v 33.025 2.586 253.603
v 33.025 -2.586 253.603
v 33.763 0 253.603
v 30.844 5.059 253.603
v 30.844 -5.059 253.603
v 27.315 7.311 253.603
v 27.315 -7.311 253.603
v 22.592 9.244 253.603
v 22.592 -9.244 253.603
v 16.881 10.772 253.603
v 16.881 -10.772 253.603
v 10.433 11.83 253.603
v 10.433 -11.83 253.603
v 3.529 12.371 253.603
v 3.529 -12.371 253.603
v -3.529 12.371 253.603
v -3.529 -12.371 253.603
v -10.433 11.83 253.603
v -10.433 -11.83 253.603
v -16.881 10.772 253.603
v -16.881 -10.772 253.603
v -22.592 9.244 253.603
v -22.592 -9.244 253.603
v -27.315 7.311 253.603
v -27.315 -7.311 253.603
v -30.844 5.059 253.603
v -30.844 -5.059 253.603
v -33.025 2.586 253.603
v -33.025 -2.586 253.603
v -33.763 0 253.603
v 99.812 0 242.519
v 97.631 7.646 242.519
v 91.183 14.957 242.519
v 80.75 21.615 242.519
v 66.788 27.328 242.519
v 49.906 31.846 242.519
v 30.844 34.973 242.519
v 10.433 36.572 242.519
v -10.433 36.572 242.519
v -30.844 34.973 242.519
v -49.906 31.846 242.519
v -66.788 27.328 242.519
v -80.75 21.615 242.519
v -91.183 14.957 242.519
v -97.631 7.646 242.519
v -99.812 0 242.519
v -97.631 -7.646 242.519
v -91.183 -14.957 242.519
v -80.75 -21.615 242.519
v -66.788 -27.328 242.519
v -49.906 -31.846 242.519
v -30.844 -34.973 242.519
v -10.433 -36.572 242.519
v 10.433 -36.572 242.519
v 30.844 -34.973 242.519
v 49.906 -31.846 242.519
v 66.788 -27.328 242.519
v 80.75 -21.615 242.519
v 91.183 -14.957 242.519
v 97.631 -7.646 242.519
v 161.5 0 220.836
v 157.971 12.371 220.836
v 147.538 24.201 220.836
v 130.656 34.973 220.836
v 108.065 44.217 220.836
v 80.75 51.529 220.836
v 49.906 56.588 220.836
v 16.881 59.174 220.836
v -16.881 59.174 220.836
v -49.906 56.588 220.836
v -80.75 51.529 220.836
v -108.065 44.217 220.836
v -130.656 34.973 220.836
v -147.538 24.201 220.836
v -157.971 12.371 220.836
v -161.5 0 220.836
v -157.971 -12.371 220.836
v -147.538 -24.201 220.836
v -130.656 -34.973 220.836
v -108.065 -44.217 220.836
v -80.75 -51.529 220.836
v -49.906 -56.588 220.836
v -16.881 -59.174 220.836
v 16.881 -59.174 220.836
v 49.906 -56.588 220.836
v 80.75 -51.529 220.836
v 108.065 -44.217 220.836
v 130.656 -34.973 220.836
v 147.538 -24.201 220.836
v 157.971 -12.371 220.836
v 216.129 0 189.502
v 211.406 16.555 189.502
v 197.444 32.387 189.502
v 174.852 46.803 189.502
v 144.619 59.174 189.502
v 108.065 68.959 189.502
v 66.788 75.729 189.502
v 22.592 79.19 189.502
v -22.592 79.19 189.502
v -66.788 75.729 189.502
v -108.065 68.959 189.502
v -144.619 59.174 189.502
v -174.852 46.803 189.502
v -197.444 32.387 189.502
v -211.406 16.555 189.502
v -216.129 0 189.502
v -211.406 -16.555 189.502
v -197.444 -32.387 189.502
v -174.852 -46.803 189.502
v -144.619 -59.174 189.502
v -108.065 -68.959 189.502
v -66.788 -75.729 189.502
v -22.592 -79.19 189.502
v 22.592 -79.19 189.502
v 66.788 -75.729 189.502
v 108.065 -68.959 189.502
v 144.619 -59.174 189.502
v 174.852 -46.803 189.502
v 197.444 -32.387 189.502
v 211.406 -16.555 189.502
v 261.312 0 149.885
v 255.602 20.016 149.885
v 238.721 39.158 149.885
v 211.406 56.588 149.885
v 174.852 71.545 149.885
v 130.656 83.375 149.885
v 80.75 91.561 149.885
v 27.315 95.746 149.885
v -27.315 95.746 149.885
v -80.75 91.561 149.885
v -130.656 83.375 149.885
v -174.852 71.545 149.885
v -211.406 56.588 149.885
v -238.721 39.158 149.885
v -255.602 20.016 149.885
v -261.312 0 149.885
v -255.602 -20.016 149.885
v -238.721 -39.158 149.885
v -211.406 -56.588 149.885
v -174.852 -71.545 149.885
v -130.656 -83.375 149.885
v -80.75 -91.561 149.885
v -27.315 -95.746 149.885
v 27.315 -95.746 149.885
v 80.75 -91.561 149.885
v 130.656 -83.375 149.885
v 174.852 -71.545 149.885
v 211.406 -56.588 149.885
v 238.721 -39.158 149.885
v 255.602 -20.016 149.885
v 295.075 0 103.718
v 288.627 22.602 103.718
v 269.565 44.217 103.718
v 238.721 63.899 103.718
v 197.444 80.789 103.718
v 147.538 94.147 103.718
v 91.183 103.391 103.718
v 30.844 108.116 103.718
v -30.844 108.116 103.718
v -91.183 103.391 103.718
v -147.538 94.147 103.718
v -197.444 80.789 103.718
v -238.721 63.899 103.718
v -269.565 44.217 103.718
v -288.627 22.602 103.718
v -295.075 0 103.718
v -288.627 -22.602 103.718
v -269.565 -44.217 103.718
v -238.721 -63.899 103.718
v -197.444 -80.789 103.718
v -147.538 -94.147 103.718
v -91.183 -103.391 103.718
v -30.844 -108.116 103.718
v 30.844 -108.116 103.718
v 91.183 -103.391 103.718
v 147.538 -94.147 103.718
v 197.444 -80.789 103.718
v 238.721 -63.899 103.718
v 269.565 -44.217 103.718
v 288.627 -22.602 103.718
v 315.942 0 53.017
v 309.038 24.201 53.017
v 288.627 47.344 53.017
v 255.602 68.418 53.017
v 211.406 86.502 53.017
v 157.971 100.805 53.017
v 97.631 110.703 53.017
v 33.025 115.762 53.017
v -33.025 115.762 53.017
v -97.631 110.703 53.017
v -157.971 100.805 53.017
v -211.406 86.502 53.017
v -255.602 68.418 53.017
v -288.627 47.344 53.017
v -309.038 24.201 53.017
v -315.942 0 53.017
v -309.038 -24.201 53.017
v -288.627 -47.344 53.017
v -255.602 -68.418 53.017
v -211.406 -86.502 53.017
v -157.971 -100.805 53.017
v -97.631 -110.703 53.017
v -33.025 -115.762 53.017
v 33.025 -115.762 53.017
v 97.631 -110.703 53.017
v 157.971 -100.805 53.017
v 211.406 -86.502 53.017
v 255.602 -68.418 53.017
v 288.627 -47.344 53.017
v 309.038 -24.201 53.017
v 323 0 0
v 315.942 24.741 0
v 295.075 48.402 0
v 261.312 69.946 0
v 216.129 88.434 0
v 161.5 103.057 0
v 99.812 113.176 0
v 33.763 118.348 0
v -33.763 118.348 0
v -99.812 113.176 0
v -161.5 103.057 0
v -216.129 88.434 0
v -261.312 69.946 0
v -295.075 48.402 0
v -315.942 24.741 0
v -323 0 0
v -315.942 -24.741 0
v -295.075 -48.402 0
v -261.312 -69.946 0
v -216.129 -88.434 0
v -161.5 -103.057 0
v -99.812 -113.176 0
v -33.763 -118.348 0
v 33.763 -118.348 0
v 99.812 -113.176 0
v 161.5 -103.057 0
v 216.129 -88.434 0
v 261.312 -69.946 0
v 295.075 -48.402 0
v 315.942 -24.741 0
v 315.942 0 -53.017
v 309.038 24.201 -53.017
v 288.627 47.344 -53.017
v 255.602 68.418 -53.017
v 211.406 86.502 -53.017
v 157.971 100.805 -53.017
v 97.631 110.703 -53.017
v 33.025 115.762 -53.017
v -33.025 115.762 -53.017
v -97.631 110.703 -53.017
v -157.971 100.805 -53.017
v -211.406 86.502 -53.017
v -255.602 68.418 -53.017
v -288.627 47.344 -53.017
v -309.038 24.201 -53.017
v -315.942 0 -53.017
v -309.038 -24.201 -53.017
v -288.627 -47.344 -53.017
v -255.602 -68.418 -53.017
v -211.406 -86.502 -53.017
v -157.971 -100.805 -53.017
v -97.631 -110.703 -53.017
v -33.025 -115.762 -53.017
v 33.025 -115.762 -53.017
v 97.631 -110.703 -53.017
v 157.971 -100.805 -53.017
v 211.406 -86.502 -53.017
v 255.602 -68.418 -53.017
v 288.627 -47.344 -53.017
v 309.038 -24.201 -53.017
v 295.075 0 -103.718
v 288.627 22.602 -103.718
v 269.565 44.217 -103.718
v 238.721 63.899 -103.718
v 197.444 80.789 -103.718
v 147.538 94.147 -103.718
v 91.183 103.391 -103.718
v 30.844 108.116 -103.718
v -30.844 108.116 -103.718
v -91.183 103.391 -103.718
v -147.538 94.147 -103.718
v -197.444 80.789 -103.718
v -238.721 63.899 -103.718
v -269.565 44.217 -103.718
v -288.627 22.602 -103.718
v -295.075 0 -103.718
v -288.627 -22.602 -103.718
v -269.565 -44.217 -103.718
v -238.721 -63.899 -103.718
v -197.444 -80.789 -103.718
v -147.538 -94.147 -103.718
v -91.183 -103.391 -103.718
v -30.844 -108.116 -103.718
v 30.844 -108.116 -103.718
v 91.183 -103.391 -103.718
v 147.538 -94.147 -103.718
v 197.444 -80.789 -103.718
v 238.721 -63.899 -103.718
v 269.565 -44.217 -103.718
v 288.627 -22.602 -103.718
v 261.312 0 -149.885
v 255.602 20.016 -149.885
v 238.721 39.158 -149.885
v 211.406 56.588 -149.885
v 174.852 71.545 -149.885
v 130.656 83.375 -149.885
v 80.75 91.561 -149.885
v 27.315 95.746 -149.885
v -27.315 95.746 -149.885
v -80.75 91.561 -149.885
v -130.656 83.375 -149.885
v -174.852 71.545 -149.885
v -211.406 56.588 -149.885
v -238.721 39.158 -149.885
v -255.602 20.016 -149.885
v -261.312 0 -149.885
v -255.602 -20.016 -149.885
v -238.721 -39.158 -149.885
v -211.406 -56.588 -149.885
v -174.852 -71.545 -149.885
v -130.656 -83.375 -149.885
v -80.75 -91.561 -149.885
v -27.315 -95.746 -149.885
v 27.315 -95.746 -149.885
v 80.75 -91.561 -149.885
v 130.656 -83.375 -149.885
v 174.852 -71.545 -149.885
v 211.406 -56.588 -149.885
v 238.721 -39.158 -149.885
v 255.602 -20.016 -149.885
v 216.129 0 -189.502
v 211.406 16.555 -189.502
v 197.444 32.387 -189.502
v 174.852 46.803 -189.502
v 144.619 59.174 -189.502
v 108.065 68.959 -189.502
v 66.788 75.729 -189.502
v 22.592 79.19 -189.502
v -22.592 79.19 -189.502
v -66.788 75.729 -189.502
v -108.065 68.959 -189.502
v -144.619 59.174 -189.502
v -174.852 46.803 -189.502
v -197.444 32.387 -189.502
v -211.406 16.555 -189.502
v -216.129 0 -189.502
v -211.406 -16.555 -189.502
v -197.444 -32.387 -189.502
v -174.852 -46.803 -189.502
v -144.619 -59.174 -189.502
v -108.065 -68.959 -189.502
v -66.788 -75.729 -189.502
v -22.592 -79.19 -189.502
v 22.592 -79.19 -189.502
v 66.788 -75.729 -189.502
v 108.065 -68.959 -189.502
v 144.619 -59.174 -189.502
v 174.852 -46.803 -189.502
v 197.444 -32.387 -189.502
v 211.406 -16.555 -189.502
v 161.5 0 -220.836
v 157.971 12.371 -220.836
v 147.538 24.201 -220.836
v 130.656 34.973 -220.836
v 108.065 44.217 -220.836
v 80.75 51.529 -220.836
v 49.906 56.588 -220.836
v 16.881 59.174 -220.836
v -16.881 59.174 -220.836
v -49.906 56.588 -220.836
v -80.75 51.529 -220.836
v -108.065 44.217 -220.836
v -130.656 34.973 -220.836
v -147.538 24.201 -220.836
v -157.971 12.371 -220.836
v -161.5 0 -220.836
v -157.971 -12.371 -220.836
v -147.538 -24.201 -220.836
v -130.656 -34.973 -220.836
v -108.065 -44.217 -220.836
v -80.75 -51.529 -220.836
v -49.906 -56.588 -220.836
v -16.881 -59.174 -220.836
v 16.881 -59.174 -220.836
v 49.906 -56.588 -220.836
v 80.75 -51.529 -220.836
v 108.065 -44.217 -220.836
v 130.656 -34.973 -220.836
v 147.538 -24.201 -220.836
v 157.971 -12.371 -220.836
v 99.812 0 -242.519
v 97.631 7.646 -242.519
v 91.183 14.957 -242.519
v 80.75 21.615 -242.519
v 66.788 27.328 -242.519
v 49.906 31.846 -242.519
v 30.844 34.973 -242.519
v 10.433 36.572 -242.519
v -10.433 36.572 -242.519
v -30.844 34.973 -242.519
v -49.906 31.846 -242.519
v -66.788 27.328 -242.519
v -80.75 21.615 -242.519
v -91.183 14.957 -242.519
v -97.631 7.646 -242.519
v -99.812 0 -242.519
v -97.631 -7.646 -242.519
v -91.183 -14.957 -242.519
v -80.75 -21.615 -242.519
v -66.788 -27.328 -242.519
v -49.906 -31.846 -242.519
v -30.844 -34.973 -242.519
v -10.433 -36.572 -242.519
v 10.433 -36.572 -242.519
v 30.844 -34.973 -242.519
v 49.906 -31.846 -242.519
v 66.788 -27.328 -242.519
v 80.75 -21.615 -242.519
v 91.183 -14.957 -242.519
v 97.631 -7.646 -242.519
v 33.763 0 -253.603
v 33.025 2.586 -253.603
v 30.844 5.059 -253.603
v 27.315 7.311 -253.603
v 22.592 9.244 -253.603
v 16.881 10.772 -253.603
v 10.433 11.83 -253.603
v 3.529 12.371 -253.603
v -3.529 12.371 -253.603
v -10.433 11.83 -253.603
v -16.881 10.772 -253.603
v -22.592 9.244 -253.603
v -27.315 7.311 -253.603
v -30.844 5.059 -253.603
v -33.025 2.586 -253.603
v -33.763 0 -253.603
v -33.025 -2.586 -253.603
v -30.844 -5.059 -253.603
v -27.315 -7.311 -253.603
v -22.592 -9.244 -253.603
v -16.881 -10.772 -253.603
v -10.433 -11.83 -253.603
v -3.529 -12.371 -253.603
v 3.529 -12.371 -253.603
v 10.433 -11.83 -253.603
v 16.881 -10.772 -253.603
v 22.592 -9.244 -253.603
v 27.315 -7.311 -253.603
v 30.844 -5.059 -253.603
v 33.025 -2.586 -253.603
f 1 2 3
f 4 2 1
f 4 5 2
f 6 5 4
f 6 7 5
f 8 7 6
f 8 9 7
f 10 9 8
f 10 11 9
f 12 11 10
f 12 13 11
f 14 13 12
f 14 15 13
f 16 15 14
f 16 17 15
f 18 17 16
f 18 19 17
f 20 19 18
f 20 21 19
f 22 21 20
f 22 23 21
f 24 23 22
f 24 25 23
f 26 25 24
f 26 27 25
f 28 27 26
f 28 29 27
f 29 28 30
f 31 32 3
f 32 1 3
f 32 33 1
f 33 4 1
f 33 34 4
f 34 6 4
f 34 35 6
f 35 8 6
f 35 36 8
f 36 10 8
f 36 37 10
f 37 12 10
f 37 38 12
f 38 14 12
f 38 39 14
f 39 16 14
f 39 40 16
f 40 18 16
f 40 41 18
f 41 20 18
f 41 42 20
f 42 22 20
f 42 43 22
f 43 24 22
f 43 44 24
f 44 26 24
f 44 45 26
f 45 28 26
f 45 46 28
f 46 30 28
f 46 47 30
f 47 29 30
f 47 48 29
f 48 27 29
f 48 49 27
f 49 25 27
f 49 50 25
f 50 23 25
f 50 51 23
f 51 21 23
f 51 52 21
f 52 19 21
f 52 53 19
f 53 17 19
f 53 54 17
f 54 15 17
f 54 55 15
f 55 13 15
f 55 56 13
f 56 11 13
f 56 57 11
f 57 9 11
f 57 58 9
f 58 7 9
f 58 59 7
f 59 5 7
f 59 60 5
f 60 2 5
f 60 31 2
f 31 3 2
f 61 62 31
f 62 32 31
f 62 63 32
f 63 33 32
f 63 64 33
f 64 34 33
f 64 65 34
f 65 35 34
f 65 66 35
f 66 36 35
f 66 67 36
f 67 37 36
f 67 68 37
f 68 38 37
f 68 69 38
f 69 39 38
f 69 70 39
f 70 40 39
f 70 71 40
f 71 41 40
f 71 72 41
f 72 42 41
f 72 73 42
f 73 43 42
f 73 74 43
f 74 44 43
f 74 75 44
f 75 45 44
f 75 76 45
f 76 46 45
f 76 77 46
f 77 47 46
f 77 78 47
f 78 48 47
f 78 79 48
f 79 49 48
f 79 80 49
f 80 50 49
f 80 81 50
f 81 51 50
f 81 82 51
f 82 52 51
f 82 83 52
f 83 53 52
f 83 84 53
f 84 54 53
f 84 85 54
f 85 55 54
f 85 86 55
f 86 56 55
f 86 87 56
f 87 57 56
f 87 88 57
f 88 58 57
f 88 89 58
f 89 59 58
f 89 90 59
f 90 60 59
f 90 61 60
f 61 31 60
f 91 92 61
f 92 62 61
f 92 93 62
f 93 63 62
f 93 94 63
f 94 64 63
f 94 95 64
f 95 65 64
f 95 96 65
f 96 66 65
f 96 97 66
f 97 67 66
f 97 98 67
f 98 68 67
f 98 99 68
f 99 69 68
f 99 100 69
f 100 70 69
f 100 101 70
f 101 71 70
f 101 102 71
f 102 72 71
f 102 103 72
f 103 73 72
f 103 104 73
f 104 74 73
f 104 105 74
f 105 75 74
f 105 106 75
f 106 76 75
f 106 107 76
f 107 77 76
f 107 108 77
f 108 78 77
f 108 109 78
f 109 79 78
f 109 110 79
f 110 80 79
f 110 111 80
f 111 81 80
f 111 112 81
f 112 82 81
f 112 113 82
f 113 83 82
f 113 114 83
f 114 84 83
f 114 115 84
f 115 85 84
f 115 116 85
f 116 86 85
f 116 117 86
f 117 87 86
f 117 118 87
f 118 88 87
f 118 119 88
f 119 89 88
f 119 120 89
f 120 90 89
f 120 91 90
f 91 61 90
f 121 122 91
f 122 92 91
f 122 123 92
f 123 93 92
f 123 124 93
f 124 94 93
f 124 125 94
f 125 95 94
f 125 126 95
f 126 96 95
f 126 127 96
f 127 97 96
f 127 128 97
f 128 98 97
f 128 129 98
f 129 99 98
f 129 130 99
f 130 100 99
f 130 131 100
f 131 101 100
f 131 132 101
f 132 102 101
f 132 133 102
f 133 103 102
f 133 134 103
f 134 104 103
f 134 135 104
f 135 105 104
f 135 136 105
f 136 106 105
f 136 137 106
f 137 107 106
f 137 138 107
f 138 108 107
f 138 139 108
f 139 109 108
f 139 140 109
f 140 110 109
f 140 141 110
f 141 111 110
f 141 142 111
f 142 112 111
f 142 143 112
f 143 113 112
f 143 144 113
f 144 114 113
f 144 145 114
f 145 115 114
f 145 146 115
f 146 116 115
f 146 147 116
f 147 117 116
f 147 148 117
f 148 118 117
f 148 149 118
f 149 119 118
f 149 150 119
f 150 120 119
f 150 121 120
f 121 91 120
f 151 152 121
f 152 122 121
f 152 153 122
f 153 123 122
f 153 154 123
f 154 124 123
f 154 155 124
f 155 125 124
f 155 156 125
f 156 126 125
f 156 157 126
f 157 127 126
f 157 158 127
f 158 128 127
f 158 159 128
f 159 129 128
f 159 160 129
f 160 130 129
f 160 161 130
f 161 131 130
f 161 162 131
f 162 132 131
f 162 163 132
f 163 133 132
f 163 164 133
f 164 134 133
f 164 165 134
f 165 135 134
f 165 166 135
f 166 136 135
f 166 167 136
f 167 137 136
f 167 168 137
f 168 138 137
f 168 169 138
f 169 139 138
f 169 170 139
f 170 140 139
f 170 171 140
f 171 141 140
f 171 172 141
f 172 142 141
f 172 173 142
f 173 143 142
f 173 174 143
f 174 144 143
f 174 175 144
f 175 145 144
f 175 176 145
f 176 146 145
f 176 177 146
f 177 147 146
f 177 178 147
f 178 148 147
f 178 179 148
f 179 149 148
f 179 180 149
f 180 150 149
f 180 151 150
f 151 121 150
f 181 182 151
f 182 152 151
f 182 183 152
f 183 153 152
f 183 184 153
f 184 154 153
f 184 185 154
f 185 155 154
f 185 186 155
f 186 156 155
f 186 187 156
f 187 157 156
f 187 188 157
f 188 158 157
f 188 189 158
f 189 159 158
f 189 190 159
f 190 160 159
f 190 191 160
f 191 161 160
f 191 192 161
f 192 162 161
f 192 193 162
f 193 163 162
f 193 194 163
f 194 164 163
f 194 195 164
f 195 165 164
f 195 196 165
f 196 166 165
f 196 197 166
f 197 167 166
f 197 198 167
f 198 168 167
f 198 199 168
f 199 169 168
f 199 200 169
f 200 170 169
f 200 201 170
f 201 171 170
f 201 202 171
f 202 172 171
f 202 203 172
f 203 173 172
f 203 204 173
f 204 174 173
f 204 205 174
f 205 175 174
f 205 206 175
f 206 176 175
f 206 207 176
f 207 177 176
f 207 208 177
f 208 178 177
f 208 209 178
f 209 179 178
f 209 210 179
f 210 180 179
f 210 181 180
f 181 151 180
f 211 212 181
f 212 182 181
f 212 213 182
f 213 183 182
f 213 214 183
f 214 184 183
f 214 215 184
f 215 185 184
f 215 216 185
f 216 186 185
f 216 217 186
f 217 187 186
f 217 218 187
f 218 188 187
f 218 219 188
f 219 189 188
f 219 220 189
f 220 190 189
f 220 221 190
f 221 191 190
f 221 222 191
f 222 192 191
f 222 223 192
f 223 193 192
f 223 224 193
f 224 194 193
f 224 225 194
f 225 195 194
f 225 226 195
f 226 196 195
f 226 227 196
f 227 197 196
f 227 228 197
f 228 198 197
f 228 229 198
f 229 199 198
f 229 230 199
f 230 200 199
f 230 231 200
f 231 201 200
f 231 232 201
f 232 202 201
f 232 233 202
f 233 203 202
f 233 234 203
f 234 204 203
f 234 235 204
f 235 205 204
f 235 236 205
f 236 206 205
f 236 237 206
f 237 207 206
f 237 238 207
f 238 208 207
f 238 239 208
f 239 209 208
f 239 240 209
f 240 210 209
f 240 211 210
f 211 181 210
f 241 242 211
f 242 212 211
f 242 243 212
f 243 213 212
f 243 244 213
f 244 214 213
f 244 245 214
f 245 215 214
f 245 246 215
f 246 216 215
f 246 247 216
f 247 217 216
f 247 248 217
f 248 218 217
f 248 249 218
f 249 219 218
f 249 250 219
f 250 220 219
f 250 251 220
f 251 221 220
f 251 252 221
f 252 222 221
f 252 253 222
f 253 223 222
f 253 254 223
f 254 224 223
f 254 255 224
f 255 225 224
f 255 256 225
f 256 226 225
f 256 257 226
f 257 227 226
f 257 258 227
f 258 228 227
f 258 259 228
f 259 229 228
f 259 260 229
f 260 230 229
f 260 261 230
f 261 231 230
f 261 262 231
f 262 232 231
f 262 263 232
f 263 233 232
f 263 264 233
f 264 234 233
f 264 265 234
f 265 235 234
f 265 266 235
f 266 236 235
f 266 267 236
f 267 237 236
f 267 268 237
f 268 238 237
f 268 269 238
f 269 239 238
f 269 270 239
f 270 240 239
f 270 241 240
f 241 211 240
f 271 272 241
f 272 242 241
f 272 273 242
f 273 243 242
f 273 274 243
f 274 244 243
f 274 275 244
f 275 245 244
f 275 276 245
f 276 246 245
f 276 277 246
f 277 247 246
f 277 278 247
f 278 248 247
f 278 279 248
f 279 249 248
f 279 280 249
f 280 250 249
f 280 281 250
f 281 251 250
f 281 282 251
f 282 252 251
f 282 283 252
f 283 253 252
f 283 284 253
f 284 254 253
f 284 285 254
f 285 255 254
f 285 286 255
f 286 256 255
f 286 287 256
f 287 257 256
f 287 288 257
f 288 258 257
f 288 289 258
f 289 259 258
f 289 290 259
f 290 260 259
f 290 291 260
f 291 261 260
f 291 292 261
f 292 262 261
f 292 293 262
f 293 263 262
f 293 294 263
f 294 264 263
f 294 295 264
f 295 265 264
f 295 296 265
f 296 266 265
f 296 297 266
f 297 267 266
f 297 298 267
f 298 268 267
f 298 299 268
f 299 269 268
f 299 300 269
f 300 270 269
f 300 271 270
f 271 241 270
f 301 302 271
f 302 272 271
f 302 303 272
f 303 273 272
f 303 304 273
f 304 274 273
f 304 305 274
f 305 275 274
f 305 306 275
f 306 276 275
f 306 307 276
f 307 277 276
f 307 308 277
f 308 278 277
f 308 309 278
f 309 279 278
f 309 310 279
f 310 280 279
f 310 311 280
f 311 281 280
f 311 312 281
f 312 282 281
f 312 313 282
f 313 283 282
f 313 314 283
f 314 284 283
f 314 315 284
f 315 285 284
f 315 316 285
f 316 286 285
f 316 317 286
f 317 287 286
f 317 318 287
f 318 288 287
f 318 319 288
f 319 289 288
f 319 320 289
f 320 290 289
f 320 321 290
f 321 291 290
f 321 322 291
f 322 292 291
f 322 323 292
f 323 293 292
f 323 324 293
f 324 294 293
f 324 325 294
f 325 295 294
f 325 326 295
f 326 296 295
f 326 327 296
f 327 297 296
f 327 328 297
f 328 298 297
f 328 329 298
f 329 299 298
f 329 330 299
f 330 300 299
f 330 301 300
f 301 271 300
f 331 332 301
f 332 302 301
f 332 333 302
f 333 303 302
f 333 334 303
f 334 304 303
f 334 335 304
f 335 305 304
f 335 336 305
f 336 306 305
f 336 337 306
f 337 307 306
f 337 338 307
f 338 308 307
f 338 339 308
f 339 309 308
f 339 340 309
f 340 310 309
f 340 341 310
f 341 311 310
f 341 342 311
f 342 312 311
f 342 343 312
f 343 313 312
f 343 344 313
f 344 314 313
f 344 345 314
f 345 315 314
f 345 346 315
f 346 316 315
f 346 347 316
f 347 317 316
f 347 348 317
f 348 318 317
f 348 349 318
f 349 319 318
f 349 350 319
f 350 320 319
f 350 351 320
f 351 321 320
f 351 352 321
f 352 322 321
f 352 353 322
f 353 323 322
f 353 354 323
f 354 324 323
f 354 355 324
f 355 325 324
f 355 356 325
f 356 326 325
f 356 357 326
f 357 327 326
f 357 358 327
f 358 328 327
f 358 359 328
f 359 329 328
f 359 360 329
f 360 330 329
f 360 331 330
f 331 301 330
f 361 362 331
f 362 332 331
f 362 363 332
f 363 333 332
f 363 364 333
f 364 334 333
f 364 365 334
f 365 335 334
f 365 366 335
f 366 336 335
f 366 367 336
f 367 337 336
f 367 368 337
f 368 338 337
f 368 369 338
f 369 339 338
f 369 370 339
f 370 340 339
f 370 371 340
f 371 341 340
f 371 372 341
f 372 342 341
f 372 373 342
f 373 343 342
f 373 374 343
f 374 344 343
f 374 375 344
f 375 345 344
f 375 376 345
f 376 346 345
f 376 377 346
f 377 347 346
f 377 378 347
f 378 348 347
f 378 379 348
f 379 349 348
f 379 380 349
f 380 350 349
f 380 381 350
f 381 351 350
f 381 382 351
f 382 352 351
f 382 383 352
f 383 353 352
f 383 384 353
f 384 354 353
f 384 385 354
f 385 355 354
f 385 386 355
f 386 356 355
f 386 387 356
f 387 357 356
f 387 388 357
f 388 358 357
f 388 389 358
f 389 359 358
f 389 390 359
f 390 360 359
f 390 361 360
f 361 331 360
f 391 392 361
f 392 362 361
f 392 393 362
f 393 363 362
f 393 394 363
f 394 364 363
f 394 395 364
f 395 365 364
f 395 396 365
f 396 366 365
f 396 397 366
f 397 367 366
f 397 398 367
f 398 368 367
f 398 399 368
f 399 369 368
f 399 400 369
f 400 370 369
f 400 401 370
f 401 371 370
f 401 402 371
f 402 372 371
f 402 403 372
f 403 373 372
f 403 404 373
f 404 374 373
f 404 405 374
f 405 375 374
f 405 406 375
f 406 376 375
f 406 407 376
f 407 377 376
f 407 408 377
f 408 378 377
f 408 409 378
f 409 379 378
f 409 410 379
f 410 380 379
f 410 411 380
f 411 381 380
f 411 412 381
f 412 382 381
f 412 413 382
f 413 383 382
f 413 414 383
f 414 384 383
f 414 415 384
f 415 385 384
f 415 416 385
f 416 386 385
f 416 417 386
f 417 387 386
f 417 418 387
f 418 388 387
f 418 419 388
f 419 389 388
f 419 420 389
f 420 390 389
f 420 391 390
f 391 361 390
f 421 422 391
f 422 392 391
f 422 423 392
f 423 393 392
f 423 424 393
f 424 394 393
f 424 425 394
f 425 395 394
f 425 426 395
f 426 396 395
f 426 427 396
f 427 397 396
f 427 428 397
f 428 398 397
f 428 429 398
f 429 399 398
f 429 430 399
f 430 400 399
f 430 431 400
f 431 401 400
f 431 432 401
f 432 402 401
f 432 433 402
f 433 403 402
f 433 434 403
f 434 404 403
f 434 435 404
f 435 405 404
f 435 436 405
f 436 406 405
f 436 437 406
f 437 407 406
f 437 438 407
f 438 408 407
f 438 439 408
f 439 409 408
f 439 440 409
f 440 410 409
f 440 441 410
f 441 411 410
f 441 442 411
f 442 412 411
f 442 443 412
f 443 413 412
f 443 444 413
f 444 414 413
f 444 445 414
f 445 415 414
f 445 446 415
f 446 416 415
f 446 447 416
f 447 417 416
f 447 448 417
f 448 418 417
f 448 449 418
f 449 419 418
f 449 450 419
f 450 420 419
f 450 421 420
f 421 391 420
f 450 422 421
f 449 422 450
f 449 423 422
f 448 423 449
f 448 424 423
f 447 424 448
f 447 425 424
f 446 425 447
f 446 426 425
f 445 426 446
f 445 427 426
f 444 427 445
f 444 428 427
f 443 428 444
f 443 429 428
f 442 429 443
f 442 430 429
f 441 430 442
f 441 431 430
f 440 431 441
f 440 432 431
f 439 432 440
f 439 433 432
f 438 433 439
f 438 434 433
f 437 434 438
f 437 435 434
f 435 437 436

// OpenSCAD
// Generated by SolidPython 1.0.1 on 2020-07-29 00:46:53


scale(v = [19, 7, 15]) {
	sphere(r = 17);
}
/***********************************************
*********      SolidPython code:      **********
************************************************
 
# import packages: SolidPython
from solid import *
from solid.utils import *
from itertools import chain, combinations, permutations


class Resize:

    def __init__(self, scad_file):
        self.scad_file = scad_file
        #self.scad_file = import_scad(scad_file)
        # cone/cylinder param:
        self.r1 = 0
        self.r2 = 0
        self.h = 0
        # rectangular prism param:
        self.w = 0
        self.l = 0
        # ellipse param:
        self.r = 0

    # import OpenScad code (file name corresponds to shape)


    # classify shape + parameters
    def assign(self, param1, param2, param3):
        if self.scad_file == 'cone.scad':
            self.r1 = param1
            self.r2 = param2
            self.h = param3
        elif self.scad_file == 'cylinder.scad':
            self.r1 = param1
            self.r2 = param2
            self.h = param3
        elif self.scad_file == 'rectangularPrism.scad':
            self.h = param1
            self.l = param2
            self.w = param3
        else:
            self.r = param1
            self.h = param2

    # resize parameters
    def iterate(self):
        x = range(3, 20, 2)
        i = 1
        if self.scad_file == 'cone.scad':
            tempList = list(permutations(x, 2))
            for temp in tempList:
                param1 = temp[0]
                param2 = temp[1]
                filepath = 'produced_scad_files/' + 'cone' + str(param1) + '_' + str(param2) + '_' + '.scad'
                scad_render_to_file(cylinder(h=param1, r1=param2, r2=0), filepath)

        elif self.scad_file == 'cylinder.scad':
            tempList = list(permutations(x, 3))
            for temp in tempList:
                param1 = temp[0]
                param2 = temp[1]
                filepath = 'produced_scad_files/' + 'cylinder' + str(param1) + '_' + str(param2) + '_' + '.scad'
                scad_render_to_file(cylinder(h=param1, r1=param2, r2=param2), filepath)

        elif self.scad_file == 'rectangularPrism.scad':
            tempList = list(permutations(x, 3))
            for temp in tempList:
                param1 = temp[0]
                param2 = temp[1]
                param3 = temp[2]
                filepath = 'produced_scad_files/' + 'rectangularPrism' + str(param1) + '_' + str(param2) + '_' + str(
                    param3) + '.scad'
                scad_render_to_file(cube(size=(param1, param2, param3)), filepath)

        elif self.scad_file == 'ellipse.scad':
            tempList = list(permutations(x, 4))
            for temp in tempList:
                param1 = temp[0]
                param2 = temp[1]
                param3 = temp[2]
                param4 = temp[3]
                filepath = 'produced_scad_files/' + 'ellipse' + str(param1) + '_' + str(param2) + '_' + str(param3) + '_' + str(param4) + '.scad'
                scad_render_to_file(scale([param1, param2, param3])(sphere(r=param4)), filepath)

    def render_to_scadfile(self):
        scad_render_to_file(scad, 'example.scad') 
 
************************************************/
